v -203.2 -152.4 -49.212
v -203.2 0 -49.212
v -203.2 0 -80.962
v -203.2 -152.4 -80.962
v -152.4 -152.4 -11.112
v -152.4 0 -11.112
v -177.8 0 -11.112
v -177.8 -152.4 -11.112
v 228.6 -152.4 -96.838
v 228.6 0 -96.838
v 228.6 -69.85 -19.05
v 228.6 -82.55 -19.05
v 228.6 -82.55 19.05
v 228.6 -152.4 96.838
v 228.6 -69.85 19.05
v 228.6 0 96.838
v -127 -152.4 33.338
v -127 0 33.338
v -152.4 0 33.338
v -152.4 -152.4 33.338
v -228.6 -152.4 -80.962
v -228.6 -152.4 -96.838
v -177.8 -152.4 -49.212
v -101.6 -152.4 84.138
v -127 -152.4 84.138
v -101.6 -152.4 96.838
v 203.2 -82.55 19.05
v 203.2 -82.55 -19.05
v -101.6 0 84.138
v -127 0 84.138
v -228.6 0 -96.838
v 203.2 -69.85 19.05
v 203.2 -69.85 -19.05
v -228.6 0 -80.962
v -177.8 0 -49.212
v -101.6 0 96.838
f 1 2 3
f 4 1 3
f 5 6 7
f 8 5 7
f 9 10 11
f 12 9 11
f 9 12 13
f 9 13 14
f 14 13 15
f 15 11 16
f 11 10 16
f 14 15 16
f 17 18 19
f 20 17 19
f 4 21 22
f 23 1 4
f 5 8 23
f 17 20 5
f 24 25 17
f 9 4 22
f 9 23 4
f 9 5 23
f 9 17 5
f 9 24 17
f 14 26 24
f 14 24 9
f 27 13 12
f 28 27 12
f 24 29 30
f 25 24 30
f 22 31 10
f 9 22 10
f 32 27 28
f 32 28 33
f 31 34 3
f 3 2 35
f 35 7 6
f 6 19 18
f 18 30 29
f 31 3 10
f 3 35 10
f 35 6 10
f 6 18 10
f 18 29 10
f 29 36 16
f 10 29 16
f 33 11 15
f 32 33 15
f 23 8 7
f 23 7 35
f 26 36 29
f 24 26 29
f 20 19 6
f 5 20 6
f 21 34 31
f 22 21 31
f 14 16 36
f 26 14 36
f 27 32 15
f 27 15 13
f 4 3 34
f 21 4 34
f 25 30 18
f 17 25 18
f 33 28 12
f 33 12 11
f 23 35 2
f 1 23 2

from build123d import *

# Parameters (mm, degrees)
F1_DEPTH = 152.4
F3_DEPTH = 25.4


with BuildPart() as f1:
    # F0 (on Front) → F1 (new body)
    with BuildSketch(Plane.XZ):
        Polygon((228.6, -96.8375), (228.6, 96.8375), (-101.6, 96.8375), (-101.6, 84.1375), (-127, 84.1375), (-127, 33.3375), (-152.4, 33.3375), (-152.4, -11.1125), (-177.8, -11.1125), (-177.8, -49.2125), (-203.2, -49.2125), (-203.2, -80.9625), (-228.6, -80.9625), (-228.6, -96.8375), align=None)
    extrude(amount=F1_DEPTH)

    # F2 (on face) → F3 (cut)
    with BuildSketch(Plane.YZ.offset(228.6)):
        Polygon((-82.55, 19.05), (-82.55, 8.069792), (-76.2, 0), (-69.85, 8.069792), (-69.85, 19.05), align=None)
        Polygon((-76.2, 0), (-82.55, 8.069792), (-82.55, -8.069792), align=None)
        Polygon((-69.85, 8.069792), (-76.2, 0), (-69.85, -8.069792), align=None)
        Polygon((-69.85, -8.069792), (-76.2, 0), (-82.55, -8.069792), (-82.55, -19.05), (-69.85, -19.05), align=None)
    extrude(amount=-F3_DEPTH, mode=Mode.SUBTRACT)


solid = f1.part
